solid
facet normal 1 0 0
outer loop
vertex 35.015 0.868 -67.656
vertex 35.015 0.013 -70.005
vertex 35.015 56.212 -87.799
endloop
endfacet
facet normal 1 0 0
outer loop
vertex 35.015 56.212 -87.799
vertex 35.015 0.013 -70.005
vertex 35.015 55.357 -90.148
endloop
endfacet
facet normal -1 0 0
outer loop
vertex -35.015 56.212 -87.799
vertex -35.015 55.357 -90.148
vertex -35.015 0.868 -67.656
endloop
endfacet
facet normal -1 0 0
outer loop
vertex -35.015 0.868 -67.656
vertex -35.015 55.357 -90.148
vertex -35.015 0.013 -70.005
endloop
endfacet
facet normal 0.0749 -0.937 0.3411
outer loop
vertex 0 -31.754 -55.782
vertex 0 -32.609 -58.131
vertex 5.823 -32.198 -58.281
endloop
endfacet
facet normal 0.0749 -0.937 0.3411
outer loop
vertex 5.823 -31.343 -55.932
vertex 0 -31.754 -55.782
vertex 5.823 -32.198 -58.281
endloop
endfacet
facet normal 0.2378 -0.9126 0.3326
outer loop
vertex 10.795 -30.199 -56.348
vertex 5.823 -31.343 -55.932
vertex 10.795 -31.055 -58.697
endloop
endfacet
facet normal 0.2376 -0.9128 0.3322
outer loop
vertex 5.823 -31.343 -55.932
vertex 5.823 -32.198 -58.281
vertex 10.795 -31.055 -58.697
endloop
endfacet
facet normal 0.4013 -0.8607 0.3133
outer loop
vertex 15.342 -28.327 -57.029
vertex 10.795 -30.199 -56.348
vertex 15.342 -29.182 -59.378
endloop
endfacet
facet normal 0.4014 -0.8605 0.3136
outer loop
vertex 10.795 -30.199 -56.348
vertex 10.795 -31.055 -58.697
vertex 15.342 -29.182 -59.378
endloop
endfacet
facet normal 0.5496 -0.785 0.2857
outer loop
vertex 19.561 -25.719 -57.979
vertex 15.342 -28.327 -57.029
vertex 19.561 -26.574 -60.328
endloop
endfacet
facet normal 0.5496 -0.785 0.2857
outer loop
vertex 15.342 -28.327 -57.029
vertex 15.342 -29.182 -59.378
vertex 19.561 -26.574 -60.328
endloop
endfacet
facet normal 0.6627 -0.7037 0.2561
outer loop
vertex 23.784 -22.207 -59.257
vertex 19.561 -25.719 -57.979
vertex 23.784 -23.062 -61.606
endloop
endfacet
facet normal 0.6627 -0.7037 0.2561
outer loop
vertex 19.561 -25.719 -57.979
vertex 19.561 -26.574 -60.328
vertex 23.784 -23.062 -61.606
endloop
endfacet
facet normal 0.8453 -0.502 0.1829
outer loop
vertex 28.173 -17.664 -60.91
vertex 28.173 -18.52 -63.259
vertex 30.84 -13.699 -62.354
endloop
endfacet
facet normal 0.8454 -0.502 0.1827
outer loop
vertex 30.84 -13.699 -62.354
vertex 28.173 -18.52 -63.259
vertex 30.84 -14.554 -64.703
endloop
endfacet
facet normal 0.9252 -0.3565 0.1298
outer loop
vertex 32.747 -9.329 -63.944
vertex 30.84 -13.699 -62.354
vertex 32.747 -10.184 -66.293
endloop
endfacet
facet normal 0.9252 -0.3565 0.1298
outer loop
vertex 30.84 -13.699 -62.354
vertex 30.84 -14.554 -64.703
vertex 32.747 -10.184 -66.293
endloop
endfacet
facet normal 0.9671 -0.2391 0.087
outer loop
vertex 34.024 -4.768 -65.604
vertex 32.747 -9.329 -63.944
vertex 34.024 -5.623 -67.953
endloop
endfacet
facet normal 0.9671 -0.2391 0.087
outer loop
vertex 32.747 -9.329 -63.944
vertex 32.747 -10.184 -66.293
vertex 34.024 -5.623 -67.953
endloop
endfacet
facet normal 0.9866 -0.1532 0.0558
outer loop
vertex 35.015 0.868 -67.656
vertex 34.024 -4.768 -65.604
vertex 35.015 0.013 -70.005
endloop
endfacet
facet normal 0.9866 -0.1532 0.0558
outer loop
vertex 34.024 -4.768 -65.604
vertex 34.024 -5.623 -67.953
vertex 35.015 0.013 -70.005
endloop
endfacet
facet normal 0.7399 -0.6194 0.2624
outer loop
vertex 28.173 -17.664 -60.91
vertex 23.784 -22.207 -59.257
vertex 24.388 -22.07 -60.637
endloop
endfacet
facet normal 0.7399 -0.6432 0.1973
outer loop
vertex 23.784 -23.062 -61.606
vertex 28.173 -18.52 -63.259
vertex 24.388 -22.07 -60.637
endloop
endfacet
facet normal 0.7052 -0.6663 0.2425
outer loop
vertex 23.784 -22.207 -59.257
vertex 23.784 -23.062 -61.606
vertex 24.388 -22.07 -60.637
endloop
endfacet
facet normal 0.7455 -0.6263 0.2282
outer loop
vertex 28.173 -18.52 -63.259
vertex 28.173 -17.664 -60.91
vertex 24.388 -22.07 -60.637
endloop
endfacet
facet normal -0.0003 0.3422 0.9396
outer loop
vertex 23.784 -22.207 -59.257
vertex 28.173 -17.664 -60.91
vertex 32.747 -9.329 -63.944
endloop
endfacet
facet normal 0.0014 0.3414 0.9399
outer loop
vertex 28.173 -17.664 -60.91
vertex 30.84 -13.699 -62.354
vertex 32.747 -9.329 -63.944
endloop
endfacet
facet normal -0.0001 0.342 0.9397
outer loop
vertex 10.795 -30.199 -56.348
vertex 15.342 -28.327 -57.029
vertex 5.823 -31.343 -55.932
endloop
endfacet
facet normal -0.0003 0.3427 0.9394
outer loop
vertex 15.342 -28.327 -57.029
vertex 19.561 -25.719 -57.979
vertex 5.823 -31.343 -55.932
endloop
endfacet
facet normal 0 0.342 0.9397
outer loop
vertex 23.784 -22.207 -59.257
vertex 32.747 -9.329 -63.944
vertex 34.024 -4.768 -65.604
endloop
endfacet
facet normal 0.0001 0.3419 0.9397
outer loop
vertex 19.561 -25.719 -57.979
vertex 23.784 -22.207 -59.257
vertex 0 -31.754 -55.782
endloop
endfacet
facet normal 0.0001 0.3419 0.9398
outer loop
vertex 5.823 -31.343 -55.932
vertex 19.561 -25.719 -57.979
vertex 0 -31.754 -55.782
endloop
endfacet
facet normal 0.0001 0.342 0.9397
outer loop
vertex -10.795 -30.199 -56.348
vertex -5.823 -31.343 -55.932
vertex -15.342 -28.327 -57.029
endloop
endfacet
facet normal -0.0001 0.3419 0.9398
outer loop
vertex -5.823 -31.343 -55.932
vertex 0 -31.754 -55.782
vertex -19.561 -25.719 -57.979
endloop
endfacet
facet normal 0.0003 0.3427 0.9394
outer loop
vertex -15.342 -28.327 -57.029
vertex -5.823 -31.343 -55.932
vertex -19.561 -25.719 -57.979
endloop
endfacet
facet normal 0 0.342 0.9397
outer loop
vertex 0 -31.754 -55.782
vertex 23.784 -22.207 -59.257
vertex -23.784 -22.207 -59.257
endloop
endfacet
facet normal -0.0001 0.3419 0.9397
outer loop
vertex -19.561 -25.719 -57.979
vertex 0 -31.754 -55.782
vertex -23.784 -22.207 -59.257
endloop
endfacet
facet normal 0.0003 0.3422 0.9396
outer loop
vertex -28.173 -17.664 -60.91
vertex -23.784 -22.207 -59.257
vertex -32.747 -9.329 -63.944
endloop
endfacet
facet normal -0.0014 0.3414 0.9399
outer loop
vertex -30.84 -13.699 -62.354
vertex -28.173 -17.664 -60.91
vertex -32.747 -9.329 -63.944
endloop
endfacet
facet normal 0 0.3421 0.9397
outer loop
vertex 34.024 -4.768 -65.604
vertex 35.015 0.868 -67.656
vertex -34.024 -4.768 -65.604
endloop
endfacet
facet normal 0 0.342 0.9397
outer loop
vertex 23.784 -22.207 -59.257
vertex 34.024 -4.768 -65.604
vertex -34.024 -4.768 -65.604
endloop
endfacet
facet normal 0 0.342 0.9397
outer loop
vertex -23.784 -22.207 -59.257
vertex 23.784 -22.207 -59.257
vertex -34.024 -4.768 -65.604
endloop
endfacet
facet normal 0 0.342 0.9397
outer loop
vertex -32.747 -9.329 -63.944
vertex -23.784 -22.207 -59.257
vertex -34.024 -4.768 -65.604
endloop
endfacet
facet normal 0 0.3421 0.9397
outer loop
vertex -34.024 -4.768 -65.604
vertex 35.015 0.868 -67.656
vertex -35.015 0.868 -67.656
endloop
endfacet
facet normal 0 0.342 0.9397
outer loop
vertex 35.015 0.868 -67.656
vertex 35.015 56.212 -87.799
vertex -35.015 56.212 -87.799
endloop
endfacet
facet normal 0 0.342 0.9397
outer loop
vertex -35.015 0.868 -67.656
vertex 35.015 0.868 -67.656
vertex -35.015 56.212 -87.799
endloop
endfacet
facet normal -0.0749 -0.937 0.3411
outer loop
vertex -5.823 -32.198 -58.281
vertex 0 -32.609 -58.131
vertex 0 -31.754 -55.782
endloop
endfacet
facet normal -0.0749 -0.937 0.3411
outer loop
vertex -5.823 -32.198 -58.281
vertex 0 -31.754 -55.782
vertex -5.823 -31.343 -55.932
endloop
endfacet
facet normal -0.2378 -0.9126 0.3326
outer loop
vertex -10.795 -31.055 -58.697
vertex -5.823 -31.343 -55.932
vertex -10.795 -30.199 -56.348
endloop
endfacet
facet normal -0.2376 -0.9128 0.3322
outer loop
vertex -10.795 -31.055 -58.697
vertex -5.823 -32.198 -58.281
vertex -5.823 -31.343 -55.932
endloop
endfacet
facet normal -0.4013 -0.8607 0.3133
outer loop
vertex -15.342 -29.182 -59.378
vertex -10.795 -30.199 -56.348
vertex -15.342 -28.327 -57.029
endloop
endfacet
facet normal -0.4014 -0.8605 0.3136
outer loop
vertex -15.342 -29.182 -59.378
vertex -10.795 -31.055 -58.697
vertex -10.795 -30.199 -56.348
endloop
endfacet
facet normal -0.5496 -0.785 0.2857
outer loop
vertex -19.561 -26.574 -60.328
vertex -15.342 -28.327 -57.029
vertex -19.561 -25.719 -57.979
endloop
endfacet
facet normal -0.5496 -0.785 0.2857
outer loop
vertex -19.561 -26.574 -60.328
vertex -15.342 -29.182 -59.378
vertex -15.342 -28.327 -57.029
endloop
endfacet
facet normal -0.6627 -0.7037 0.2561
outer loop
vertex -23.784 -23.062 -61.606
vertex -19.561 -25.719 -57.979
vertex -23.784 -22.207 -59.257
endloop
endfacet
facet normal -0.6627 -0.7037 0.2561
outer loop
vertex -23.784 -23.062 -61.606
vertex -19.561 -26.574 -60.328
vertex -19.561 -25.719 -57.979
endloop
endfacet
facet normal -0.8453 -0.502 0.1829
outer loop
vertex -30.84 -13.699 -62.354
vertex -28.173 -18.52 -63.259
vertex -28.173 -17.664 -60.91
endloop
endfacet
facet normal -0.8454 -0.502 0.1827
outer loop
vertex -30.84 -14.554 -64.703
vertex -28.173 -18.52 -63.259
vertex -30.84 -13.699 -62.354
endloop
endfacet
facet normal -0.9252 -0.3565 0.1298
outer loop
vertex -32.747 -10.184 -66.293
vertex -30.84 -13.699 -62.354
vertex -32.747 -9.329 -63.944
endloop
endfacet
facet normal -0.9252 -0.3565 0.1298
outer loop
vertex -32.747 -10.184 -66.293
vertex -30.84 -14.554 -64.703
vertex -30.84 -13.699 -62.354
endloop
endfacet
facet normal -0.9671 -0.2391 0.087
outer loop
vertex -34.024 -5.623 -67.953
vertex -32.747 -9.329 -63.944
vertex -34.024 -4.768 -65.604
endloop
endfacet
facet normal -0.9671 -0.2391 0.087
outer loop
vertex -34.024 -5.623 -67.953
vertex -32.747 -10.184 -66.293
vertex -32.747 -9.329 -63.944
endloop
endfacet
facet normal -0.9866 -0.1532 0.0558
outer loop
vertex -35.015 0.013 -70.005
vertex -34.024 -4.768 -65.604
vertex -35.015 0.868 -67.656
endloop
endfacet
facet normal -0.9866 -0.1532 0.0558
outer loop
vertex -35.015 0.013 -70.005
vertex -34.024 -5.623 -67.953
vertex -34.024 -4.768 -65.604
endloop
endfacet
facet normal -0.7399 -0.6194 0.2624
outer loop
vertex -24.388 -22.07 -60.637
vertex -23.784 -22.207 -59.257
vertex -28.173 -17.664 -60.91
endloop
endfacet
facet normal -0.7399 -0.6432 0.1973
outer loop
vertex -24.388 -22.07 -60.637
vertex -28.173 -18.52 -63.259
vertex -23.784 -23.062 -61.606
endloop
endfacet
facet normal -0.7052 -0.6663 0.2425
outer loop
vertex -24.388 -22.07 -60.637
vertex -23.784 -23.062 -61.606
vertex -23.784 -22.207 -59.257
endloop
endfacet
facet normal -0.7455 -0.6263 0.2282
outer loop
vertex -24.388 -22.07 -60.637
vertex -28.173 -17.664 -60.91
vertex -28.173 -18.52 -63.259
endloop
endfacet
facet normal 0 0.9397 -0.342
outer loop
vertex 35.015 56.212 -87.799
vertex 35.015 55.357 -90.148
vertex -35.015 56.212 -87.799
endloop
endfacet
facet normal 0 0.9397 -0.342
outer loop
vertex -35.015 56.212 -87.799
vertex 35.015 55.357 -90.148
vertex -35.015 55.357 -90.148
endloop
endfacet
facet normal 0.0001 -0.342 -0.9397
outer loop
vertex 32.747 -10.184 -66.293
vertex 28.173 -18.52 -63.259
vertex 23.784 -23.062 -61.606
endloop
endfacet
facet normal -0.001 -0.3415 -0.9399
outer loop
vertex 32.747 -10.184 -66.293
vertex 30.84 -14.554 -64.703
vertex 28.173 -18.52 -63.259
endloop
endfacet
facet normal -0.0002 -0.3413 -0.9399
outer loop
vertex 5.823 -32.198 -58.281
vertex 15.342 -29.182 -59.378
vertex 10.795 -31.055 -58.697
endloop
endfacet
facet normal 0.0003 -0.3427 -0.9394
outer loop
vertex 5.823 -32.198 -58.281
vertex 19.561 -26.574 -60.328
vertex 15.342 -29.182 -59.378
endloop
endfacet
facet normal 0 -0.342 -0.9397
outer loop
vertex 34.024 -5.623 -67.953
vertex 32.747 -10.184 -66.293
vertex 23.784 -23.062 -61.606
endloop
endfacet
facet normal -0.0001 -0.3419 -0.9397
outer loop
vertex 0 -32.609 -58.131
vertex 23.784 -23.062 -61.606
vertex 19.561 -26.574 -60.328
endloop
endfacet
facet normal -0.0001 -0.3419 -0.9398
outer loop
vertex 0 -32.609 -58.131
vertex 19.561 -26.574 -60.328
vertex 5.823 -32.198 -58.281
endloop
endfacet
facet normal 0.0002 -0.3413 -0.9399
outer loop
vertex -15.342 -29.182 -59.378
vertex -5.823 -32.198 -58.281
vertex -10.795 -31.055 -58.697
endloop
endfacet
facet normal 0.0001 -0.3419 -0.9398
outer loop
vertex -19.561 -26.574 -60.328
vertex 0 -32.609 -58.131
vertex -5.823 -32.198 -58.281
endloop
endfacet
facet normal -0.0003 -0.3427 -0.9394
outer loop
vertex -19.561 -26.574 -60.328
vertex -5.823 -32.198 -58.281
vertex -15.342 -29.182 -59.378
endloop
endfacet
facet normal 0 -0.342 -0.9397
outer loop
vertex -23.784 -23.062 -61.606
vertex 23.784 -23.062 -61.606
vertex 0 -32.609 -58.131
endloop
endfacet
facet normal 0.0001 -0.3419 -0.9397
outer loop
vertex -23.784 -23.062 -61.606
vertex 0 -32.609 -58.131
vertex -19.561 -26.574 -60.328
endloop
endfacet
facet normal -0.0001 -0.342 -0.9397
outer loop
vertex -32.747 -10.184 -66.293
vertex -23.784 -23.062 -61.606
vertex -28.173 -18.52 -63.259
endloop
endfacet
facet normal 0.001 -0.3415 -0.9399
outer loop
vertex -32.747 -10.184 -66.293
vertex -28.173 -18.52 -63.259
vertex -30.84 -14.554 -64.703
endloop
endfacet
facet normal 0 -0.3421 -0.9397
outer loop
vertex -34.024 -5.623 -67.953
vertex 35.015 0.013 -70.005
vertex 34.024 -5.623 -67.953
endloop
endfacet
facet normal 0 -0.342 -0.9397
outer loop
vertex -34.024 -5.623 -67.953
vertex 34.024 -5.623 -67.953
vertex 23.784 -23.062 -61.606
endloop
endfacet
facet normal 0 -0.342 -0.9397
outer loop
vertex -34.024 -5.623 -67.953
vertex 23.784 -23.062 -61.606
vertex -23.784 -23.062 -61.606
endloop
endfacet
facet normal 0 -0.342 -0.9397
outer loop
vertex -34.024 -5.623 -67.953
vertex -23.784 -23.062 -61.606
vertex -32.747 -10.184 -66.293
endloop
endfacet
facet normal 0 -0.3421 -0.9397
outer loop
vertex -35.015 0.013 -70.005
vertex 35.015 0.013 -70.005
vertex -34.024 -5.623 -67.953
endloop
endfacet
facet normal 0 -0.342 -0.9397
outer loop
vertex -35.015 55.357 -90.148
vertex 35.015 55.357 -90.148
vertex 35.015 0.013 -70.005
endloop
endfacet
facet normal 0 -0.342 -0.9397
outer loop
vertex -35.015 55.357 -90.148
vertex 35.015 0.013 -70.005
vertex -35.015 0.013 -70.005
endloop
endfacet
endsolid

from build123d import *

# Parameters (mm, degrees)
F6_DEPTH = 2.5


with BuildPart() as f6:
    # F5 (on line) → F6 (new body)
    with BuildSketch(Plane(origin=(0, -22.497566339, -61.8115555092), x_dir=(1, 0, 0), z_dir=(0, 0.3420201433, 0.9396926208))):
        with BuildLine():
            add(Edge.make_bspline(
                [(0, -10.7600335032), (-12.424566783, -10.7759898528), (-25.8446539441, 0.2358042705), (-33.2600735128, 10.1268971339), (-35.0152626634, 23.9554308355)],
                knots=[0, 0, 0, 0, 0.5021229649, 1, 1, 1, 1], degree=3))
            add(Edge.make_bspline(
                [(0, -10.7600335032), (12.424566783, -10.7759898528), (25.8446539441, 0.2358042705), (33.2600735128, 10.1268971339), (35.0152626634, 23.9554308355)],
                knots=[0, 0, 0, 0, 0.5021229649, 1, 1, 1, 1], degree=3))
            Line((35.0152626634, 23.9554308355), (35.0152626634, 82.8513292865))
            Line((35.0152626634, 82.8513292865), (-35.0152626634, 82.8513292865))
            Line((-35.0152626634, 82.8513292865), (-35.0152626634, 23.9554308355))
        make_face()
    extrude(amount=F6_DEPTH)


solid = f6.part
